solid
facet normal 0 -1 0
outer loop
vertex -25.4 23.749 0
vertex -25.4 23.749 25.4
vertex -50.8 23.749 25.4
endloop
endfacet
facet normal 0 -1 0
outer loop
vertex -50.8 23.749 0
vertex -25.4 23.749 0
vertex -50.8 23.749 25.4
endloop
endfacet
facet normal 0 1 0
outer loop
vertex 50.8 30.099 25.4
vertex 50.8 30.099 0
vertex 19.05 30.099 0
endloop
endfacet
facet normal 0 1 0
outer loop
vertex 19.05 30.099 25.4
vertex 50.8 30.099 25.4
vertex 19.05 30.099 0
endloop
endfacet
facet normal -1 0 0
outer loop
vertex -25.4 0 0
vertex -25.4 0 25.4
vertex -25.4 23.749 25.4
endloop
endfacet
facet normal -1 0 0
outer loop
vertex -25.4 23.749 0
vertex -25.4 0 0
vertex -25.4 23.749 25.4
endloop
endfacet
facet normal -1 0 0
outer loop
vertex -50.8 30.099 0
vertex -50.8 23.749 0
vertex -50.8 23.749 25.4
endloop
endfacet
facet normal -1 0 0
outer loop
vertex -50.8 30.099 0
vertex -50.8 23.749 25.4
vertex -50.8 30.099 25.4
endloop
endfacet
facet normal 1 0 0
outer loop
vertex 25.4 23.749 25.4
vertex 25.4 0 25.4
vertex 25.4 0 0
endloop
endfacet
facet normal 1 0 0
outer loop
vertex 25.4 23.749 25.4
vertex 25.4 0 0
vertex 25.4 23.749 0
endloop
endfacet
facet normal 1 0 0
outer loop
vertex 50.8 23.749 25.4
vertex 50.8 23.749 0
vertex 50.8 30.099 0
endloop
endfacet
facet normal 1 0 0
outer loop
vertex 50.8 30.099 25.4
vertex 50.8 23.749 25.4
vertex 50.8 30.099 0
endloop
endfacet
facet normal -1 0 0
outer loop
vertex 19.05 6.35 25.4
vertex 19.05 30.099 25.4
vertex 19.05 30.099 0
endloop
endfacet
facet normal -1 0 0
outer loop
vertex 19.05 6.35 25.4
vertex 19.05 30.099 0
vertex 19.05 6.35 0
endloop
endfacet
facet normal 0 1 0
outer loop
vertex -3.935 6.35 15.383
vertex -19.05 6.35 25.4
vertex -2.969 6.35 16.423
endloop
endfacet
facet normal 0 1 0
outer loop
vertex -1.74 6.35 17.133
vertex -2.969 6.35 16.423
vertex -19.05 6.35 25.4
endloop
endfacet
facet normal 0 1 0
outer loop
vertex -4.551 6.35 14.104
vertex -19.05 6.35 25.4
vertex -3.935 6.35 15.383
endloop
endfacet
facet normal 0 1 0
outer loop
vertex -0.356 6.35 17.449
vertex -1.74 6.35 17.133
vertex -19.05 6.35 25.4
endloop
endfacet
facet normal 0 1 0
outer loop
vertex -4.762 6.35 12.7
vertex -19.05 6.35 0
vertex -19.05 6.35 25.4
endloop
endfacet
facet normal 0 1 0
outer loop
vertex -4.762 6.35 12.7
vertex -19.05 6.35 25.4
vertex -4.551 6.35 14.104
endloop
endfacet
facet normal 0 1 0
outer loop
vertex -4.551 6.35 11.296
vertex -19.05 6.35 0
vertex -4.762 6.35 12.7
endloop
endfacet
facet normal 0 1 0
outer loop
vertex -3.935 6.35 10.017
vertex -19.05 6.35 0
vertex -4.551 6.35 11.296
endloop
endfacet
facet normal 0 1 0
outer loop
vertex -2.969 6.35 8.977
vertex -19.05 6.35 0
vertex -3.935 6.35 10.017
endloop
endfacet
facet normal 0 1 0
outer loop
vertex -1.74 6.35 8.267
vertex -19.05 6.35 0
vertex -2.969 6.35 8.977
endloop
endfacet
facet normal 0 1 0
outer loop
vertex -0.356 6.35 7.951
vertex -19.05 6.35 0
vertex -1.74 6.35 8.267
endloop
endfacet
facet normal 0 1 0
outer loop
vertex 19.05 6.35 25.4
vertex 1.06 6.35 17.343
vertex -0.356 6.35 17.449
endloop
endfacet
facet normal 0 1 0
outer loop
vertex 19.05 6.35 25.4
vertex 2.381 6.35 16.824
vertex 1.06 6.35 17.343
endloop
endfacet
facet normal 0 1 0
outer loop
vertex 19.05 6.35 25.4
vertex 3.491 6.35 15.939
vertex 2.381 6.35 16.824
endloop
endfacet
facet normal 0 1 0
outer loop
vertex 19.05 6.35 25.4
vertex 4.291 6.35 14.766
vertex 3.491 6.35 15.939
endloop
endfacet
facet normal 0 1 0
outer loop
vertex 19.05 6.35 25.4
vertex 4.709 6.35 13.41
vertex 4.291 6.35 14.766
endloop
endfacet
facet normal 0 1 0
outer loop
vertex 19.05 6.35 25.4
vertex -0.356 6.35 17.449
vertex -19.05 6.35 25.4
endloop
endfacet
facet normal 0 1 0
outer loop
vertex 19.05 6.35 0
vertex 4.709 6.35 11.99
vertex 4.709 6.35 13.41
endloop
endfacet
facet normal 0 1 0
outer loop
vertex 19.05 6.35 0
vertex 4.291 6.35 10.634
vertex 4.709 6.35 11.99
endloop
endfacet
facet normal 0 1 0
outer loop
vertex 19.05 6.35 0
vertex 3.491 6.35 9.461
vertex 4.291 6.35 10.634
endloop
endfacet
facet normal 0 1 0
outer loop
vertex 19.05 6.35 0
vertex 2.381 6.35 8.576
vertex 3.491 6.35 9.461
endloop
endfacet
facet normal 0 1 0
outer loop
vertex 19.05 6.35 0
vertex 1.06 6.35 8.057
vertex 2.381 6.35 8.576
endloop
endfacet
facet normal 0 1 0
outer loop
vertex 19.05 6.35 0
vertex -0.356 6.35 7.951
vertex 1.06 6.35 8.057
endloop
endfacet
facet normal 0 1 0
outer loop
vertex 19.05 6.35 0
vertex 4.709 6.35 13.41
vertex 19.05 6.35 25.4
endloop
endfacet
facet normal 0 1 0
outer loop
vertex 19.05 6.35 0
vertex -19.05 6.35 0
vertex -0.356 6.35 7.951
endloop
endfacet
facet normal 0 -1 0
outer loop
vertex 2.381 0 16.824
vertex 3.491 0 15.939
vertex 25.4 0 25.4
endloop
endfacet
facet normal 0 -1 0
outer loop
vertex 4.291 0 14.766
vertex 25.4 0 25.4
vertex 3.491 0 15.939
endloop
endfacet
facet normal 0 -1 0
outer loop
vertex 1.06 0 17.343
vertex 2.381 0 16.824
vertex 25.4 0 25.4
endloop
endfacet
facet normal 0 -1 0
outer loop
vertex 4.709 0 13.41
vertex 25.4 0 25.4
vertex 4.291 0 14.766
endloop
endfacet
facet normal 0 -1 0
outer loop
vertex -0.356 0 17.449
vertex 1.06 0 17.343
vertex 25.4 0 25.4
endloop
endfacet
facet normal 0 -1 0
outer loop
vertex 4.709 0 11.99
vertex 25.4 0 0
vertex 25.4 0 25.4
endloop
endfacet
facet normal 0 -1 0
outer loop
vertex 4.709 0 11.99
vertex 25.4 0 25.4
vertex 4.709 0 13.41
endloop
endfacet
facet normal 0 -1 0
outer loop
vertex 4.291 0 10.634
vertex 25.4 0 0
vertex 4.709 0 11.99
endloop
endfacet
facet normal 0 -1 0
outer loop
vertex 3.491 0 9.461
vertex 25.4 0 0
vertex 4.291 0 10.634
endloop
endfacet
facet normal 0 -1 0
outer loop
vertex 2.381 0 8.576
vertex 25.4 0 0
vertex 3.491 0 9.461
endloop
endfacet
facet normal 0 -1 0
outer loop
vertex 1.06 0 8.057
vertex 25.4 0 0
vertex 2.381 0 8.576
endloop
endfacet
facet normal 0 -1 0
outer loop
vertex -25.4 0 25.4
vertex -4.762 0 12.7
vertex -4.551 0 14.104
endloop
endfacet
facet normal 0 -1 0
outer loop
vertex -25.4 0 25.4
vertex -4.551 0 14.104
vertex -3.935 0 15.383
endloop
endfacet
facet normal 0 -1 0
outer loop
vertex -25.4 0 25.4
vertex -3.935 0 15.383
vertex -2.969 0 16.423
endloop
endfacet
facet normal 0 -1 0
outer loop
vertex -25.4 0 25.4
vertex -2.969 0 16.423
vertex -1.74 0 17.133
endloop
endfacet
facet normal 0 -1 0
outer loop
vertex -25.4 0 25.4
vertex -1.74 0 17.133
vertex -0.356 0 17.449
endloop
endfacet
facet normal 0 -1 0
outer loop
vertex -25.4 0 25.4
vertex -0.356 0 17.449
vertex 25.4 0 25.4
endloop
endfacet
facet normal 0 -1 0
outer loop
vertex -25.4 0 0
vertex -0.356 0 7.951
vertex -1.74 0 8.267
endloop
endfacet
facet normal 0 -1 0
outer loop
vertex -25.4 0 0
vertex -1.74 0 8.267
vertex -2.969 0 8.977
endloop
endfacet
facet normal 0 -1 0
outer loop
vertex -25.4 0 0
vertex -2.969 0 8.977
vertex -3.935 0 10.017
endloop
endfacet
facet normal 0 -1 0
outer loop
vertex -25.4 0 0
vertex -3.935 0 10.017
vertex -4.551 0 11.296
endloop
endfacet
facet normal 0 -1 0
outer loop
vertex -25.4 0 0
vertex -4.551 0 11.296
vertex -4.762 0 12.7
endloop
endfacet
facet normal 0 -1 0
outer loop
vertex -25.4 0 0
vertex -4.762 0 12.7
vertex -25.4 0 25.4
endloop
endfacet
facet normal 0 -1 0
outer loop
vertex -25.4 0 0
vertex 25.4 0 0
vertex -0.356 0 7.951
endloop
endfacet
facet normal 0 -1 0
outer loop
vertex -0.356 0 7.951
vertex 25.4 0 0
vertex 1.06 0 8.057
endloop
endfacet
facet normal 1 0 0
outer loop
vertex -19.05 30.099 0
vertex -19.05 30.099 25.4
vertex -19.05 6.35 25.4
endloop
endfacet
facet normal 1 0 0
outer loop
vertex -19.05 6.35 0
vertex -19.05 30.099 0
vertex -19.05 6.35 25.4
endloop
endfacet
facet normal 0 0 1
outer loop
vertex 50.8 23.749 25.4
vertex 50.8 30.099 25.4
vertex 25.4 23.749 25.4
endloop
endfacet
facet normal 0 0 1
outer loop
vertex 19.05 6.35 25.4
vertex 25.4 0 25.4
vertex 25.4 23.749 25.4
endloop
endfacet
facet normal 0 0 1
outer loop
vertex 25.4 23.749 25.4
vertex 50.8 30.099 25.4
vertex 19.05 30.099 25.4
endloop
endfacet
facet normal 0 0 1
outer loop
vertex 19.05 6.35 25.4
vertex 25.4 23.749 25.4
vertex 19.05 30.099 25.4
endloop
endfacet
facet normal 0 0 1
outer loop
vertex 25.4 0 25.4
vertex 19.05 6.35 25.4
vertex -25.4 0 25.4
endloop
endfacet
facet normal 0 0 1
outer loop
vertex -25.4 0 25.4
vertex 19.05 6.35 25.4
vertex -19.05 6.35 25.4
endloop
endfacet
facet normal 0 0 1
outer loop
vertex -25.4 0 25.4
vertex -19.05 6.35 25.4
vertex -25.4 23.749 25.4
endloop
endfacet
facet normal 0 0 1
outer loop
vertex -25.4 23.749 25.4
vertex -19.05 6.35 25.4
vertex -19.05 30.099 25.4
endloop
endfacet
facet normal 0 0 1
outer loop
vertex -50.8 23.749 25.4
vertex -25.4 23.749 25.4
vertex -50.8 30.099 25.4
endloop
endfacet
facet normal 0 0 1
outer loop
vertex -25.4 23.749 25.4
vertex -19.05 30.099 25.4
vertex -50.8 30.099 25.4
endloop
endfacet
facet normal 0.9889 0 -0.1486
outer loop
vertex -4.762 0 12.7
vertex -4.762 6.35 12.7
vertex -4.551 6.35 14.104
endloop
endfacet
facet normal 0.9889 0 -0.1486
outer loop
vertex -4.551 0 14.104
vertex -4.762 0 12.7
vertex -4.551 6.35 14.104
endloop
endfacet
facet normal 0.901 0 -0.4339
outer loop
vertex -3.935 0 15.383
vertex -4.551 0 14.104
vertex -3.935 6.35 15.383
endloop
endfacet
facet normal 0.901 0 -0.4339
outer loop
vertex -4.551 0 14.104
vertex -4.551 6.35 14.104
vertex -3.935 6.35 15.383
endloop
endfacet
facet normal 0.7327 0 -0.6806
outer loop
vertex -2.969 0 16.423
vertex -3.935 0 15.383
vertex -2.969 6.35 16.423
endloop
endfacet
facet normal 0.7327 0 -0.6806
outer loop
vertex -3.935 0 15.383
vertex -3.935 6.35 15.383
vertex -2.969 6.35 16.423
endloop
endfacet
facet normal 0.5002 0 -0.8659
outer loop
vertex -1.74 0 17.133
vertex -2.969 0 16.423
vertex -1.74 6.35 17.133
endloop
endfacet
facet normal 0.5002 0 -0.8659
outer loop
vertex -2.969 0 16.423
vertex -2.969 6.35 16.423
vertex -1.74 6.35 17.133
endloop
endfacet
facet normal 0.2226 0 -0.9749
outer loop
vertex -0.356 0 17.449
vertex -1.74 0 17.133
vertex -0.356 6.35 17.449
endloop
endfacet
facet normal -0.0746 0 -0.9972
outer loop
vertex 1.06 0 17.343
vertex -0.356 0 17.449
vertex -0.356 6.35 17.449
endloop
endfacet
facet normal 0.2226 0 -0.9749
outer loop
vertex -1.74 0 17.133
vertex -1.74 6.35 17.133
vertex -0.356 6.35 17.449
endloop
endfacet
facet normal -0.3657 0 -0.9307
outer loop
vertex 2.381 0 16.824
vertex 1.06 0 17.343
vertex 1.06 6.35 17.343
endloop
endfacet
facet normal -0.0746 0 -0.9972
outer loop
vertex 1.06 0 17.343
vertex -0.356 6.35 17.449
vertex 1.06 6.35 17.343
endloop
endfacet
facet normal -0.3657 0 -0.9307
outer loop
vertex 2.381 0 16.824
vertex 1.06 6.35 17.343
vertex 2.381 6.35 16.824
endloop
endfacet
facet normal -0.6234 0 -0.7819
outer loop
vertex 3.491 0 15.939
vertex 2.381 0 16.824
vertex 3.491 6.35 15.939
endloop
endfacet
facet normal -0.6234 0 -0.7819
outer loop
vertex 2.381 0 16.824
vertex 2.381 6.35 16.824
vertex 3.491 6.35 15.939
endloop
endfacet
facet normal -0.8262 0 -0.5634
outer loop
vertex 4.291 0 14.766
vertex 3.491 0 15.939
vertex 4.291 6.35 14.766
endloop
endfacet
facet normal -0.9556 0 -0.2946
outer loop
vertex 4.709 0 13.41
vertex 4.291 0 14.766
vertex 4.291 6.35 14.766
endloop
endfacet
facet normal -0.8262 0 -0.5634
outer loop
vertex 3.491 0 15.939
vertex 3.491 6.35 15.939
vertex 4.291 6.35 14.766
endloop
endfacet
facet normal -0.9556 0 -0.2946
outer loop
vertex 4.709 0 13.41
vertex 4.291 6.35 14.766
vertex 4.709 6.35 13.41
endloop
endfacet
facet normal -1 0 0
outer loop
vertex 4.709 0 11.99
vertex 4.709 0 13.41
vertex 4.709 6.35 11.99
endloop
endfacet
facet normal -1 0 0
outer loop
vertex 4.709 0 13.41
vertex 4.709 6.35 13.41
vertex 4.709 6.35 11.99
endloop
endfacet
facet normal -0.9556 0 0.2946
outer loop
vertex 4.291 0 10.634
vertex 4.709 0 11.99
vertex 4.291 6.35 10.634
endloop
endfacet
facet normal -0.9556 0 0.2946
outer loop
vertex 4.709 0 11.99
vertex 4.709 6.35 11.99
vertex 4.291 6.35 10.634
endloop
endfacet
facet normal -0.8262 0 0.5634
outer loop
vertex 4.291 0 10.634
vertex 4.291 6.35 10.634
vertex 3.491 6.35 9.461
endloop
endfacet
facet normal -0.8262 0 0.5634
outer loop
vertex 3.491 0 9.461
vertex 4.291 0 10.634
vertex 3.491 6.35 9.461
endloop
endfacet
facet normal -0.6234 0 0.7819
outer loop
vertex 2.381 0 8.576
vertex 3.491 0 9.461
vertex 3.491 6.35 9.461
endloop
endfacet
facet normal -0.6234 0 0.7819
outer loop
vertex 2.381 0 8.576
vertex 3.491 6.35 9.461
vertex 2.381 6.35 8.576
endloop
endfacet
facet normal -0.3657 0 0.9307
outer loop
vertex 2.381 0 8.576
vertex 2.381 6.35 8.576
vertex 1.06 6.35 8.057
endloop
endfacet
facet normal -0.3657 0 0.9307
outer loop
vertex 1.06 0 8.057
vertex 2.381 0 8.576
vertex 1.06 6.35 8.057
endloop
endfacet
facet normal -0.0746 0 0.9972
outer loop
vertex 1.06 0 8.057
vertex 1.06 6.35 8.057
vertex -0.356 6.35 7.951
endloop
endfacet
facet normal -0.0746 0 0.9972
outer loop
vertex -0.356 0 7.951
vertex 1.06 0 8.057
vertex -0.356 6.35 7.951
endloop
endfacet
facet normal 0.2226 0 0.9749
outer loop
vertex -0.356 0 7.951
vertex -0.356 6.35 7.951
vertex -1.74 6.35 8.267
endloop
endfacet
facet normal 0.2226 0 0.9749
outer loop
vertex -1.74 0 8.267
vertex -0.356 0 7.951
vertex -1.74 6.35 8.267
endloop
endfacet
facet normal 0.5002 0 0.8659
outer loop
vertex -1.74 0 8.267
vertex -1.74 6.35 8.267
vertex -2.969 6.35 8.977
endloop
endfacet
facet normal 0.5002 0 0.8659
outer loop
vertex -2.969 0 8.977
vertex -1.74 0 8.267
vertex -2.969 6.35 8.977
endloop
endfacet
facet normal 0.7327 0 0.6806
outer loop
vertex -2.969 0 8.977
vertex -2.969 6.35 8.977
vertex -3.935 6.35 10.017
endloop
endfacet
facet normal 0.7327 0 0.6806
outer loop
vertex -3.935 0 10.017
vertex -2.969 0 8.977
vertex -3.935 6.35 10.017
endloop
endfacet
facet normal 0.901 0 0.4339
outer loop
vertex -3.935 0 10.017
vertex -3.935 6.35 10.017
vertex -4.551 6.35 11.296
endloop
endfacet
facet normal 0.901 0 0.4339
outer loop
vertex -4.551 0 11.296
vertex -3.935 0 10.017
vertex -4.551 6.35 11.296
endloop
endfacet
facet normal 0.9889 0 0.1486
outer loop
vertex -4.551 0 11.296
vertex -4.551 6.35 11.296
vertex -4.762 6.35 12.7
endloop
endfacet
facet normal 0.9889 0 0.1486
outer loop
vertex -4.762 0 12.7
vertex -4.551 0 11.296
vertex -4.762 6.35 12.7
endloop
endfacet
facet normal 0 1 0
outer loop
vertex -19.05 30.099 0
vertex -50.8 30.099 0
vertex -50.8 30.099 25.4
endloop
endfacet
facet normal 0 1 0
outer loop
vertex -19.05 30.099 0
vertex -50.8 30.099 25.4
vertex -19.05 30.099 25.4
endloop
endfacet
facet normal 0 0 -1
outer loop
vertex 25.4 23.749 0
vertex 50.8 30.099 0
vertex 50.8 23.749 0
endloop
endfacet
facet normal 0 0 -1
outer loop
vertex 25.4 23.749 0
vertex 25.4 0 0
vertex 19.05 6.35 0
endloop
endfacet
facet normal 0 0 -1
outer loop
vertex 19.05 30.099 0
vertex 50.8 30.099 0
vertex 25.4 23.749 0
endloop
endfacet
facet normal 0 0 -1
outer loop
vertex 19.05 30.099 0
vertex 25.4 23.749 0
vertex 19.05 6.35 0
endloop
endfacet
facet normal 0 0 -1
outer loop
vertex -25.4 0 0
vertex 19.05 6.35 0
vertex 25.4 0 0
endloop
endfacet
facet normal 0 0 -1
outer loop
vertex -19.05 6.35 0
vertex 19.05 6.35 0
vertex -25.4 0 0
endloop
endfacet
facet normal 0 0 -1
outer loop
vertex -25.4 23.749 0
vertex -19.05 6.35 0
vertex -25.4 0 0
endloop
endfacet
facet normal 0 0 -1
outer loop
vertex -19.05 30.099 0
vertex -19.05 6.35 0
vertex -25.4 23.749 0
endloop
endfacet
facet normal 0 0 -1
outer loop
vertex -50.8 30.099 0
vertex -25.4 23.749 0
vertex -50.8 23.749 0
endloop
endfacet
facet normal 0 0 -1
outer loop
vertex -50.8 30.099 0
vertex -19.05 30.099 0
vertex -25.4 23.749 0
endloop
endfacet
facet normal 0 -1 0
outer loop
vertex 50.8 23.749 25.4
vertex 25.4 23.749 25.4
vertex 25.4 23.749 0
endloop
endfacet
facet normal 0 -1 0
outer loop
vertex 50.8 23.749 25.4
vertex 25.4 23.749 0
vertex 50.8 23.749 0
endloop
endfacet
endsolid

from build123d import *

# Parameters (mm, degrees)
BOSS_EXTRUDE1_DEPTH = 25.4
CUT_EXTRUDE1_REACH  = 63.561
SKETCH2_R           = 4.7625


with BuildPart() as part:
    # Sketch1 → Boss-Extrude1 (new body)
    with BuildSketch(Plane.XY):
        Polygon((0, 0), (25.4, 0), (25.4, 23.749), (50.8, 23.749), (50.8, 30.099), (19.05, 30.099), (19.05, 6.35), (0, 6.35), align=None)
    extrude(amount=BOSS_EXTRUDE1_DEPTH)

    # Mirror1: part across plane


with BuildPart() as part_1:
    add(part.part)
    add(part.part.mirror(Plane(origin=(0, 6.35, 25.4), x_dir=(0, 0, 1), z_dir=(1, 0, 0))))

    # Sketch2 → Cut-Extrude1 (cut, up to next)
    with BuildSketch(Plane(origin=(0, 6.35, 0), x_dir=(1, 0, 0), z_dir=(0, 1, 0)), mode=Mode.PRIVATE) as cut_extrude1_sk1:
        with Locations(Location((0, -12.7, 0), (0, 0, 180))):
            Circle(SKETCH2_R)
    cut_extrude1_tool1 = extrude(cut_extrude1_sk1.sketch, amount=-CUT_EXTRUDE1_REACH, mode=Mode.PRIVATE) & part_1.part
    add(cut_extrude1_tool1.solids().sort_by_distance((0, 6.35, 12.7))[0], mode=Mode.SUBTRACT)


solid = part_1.part
